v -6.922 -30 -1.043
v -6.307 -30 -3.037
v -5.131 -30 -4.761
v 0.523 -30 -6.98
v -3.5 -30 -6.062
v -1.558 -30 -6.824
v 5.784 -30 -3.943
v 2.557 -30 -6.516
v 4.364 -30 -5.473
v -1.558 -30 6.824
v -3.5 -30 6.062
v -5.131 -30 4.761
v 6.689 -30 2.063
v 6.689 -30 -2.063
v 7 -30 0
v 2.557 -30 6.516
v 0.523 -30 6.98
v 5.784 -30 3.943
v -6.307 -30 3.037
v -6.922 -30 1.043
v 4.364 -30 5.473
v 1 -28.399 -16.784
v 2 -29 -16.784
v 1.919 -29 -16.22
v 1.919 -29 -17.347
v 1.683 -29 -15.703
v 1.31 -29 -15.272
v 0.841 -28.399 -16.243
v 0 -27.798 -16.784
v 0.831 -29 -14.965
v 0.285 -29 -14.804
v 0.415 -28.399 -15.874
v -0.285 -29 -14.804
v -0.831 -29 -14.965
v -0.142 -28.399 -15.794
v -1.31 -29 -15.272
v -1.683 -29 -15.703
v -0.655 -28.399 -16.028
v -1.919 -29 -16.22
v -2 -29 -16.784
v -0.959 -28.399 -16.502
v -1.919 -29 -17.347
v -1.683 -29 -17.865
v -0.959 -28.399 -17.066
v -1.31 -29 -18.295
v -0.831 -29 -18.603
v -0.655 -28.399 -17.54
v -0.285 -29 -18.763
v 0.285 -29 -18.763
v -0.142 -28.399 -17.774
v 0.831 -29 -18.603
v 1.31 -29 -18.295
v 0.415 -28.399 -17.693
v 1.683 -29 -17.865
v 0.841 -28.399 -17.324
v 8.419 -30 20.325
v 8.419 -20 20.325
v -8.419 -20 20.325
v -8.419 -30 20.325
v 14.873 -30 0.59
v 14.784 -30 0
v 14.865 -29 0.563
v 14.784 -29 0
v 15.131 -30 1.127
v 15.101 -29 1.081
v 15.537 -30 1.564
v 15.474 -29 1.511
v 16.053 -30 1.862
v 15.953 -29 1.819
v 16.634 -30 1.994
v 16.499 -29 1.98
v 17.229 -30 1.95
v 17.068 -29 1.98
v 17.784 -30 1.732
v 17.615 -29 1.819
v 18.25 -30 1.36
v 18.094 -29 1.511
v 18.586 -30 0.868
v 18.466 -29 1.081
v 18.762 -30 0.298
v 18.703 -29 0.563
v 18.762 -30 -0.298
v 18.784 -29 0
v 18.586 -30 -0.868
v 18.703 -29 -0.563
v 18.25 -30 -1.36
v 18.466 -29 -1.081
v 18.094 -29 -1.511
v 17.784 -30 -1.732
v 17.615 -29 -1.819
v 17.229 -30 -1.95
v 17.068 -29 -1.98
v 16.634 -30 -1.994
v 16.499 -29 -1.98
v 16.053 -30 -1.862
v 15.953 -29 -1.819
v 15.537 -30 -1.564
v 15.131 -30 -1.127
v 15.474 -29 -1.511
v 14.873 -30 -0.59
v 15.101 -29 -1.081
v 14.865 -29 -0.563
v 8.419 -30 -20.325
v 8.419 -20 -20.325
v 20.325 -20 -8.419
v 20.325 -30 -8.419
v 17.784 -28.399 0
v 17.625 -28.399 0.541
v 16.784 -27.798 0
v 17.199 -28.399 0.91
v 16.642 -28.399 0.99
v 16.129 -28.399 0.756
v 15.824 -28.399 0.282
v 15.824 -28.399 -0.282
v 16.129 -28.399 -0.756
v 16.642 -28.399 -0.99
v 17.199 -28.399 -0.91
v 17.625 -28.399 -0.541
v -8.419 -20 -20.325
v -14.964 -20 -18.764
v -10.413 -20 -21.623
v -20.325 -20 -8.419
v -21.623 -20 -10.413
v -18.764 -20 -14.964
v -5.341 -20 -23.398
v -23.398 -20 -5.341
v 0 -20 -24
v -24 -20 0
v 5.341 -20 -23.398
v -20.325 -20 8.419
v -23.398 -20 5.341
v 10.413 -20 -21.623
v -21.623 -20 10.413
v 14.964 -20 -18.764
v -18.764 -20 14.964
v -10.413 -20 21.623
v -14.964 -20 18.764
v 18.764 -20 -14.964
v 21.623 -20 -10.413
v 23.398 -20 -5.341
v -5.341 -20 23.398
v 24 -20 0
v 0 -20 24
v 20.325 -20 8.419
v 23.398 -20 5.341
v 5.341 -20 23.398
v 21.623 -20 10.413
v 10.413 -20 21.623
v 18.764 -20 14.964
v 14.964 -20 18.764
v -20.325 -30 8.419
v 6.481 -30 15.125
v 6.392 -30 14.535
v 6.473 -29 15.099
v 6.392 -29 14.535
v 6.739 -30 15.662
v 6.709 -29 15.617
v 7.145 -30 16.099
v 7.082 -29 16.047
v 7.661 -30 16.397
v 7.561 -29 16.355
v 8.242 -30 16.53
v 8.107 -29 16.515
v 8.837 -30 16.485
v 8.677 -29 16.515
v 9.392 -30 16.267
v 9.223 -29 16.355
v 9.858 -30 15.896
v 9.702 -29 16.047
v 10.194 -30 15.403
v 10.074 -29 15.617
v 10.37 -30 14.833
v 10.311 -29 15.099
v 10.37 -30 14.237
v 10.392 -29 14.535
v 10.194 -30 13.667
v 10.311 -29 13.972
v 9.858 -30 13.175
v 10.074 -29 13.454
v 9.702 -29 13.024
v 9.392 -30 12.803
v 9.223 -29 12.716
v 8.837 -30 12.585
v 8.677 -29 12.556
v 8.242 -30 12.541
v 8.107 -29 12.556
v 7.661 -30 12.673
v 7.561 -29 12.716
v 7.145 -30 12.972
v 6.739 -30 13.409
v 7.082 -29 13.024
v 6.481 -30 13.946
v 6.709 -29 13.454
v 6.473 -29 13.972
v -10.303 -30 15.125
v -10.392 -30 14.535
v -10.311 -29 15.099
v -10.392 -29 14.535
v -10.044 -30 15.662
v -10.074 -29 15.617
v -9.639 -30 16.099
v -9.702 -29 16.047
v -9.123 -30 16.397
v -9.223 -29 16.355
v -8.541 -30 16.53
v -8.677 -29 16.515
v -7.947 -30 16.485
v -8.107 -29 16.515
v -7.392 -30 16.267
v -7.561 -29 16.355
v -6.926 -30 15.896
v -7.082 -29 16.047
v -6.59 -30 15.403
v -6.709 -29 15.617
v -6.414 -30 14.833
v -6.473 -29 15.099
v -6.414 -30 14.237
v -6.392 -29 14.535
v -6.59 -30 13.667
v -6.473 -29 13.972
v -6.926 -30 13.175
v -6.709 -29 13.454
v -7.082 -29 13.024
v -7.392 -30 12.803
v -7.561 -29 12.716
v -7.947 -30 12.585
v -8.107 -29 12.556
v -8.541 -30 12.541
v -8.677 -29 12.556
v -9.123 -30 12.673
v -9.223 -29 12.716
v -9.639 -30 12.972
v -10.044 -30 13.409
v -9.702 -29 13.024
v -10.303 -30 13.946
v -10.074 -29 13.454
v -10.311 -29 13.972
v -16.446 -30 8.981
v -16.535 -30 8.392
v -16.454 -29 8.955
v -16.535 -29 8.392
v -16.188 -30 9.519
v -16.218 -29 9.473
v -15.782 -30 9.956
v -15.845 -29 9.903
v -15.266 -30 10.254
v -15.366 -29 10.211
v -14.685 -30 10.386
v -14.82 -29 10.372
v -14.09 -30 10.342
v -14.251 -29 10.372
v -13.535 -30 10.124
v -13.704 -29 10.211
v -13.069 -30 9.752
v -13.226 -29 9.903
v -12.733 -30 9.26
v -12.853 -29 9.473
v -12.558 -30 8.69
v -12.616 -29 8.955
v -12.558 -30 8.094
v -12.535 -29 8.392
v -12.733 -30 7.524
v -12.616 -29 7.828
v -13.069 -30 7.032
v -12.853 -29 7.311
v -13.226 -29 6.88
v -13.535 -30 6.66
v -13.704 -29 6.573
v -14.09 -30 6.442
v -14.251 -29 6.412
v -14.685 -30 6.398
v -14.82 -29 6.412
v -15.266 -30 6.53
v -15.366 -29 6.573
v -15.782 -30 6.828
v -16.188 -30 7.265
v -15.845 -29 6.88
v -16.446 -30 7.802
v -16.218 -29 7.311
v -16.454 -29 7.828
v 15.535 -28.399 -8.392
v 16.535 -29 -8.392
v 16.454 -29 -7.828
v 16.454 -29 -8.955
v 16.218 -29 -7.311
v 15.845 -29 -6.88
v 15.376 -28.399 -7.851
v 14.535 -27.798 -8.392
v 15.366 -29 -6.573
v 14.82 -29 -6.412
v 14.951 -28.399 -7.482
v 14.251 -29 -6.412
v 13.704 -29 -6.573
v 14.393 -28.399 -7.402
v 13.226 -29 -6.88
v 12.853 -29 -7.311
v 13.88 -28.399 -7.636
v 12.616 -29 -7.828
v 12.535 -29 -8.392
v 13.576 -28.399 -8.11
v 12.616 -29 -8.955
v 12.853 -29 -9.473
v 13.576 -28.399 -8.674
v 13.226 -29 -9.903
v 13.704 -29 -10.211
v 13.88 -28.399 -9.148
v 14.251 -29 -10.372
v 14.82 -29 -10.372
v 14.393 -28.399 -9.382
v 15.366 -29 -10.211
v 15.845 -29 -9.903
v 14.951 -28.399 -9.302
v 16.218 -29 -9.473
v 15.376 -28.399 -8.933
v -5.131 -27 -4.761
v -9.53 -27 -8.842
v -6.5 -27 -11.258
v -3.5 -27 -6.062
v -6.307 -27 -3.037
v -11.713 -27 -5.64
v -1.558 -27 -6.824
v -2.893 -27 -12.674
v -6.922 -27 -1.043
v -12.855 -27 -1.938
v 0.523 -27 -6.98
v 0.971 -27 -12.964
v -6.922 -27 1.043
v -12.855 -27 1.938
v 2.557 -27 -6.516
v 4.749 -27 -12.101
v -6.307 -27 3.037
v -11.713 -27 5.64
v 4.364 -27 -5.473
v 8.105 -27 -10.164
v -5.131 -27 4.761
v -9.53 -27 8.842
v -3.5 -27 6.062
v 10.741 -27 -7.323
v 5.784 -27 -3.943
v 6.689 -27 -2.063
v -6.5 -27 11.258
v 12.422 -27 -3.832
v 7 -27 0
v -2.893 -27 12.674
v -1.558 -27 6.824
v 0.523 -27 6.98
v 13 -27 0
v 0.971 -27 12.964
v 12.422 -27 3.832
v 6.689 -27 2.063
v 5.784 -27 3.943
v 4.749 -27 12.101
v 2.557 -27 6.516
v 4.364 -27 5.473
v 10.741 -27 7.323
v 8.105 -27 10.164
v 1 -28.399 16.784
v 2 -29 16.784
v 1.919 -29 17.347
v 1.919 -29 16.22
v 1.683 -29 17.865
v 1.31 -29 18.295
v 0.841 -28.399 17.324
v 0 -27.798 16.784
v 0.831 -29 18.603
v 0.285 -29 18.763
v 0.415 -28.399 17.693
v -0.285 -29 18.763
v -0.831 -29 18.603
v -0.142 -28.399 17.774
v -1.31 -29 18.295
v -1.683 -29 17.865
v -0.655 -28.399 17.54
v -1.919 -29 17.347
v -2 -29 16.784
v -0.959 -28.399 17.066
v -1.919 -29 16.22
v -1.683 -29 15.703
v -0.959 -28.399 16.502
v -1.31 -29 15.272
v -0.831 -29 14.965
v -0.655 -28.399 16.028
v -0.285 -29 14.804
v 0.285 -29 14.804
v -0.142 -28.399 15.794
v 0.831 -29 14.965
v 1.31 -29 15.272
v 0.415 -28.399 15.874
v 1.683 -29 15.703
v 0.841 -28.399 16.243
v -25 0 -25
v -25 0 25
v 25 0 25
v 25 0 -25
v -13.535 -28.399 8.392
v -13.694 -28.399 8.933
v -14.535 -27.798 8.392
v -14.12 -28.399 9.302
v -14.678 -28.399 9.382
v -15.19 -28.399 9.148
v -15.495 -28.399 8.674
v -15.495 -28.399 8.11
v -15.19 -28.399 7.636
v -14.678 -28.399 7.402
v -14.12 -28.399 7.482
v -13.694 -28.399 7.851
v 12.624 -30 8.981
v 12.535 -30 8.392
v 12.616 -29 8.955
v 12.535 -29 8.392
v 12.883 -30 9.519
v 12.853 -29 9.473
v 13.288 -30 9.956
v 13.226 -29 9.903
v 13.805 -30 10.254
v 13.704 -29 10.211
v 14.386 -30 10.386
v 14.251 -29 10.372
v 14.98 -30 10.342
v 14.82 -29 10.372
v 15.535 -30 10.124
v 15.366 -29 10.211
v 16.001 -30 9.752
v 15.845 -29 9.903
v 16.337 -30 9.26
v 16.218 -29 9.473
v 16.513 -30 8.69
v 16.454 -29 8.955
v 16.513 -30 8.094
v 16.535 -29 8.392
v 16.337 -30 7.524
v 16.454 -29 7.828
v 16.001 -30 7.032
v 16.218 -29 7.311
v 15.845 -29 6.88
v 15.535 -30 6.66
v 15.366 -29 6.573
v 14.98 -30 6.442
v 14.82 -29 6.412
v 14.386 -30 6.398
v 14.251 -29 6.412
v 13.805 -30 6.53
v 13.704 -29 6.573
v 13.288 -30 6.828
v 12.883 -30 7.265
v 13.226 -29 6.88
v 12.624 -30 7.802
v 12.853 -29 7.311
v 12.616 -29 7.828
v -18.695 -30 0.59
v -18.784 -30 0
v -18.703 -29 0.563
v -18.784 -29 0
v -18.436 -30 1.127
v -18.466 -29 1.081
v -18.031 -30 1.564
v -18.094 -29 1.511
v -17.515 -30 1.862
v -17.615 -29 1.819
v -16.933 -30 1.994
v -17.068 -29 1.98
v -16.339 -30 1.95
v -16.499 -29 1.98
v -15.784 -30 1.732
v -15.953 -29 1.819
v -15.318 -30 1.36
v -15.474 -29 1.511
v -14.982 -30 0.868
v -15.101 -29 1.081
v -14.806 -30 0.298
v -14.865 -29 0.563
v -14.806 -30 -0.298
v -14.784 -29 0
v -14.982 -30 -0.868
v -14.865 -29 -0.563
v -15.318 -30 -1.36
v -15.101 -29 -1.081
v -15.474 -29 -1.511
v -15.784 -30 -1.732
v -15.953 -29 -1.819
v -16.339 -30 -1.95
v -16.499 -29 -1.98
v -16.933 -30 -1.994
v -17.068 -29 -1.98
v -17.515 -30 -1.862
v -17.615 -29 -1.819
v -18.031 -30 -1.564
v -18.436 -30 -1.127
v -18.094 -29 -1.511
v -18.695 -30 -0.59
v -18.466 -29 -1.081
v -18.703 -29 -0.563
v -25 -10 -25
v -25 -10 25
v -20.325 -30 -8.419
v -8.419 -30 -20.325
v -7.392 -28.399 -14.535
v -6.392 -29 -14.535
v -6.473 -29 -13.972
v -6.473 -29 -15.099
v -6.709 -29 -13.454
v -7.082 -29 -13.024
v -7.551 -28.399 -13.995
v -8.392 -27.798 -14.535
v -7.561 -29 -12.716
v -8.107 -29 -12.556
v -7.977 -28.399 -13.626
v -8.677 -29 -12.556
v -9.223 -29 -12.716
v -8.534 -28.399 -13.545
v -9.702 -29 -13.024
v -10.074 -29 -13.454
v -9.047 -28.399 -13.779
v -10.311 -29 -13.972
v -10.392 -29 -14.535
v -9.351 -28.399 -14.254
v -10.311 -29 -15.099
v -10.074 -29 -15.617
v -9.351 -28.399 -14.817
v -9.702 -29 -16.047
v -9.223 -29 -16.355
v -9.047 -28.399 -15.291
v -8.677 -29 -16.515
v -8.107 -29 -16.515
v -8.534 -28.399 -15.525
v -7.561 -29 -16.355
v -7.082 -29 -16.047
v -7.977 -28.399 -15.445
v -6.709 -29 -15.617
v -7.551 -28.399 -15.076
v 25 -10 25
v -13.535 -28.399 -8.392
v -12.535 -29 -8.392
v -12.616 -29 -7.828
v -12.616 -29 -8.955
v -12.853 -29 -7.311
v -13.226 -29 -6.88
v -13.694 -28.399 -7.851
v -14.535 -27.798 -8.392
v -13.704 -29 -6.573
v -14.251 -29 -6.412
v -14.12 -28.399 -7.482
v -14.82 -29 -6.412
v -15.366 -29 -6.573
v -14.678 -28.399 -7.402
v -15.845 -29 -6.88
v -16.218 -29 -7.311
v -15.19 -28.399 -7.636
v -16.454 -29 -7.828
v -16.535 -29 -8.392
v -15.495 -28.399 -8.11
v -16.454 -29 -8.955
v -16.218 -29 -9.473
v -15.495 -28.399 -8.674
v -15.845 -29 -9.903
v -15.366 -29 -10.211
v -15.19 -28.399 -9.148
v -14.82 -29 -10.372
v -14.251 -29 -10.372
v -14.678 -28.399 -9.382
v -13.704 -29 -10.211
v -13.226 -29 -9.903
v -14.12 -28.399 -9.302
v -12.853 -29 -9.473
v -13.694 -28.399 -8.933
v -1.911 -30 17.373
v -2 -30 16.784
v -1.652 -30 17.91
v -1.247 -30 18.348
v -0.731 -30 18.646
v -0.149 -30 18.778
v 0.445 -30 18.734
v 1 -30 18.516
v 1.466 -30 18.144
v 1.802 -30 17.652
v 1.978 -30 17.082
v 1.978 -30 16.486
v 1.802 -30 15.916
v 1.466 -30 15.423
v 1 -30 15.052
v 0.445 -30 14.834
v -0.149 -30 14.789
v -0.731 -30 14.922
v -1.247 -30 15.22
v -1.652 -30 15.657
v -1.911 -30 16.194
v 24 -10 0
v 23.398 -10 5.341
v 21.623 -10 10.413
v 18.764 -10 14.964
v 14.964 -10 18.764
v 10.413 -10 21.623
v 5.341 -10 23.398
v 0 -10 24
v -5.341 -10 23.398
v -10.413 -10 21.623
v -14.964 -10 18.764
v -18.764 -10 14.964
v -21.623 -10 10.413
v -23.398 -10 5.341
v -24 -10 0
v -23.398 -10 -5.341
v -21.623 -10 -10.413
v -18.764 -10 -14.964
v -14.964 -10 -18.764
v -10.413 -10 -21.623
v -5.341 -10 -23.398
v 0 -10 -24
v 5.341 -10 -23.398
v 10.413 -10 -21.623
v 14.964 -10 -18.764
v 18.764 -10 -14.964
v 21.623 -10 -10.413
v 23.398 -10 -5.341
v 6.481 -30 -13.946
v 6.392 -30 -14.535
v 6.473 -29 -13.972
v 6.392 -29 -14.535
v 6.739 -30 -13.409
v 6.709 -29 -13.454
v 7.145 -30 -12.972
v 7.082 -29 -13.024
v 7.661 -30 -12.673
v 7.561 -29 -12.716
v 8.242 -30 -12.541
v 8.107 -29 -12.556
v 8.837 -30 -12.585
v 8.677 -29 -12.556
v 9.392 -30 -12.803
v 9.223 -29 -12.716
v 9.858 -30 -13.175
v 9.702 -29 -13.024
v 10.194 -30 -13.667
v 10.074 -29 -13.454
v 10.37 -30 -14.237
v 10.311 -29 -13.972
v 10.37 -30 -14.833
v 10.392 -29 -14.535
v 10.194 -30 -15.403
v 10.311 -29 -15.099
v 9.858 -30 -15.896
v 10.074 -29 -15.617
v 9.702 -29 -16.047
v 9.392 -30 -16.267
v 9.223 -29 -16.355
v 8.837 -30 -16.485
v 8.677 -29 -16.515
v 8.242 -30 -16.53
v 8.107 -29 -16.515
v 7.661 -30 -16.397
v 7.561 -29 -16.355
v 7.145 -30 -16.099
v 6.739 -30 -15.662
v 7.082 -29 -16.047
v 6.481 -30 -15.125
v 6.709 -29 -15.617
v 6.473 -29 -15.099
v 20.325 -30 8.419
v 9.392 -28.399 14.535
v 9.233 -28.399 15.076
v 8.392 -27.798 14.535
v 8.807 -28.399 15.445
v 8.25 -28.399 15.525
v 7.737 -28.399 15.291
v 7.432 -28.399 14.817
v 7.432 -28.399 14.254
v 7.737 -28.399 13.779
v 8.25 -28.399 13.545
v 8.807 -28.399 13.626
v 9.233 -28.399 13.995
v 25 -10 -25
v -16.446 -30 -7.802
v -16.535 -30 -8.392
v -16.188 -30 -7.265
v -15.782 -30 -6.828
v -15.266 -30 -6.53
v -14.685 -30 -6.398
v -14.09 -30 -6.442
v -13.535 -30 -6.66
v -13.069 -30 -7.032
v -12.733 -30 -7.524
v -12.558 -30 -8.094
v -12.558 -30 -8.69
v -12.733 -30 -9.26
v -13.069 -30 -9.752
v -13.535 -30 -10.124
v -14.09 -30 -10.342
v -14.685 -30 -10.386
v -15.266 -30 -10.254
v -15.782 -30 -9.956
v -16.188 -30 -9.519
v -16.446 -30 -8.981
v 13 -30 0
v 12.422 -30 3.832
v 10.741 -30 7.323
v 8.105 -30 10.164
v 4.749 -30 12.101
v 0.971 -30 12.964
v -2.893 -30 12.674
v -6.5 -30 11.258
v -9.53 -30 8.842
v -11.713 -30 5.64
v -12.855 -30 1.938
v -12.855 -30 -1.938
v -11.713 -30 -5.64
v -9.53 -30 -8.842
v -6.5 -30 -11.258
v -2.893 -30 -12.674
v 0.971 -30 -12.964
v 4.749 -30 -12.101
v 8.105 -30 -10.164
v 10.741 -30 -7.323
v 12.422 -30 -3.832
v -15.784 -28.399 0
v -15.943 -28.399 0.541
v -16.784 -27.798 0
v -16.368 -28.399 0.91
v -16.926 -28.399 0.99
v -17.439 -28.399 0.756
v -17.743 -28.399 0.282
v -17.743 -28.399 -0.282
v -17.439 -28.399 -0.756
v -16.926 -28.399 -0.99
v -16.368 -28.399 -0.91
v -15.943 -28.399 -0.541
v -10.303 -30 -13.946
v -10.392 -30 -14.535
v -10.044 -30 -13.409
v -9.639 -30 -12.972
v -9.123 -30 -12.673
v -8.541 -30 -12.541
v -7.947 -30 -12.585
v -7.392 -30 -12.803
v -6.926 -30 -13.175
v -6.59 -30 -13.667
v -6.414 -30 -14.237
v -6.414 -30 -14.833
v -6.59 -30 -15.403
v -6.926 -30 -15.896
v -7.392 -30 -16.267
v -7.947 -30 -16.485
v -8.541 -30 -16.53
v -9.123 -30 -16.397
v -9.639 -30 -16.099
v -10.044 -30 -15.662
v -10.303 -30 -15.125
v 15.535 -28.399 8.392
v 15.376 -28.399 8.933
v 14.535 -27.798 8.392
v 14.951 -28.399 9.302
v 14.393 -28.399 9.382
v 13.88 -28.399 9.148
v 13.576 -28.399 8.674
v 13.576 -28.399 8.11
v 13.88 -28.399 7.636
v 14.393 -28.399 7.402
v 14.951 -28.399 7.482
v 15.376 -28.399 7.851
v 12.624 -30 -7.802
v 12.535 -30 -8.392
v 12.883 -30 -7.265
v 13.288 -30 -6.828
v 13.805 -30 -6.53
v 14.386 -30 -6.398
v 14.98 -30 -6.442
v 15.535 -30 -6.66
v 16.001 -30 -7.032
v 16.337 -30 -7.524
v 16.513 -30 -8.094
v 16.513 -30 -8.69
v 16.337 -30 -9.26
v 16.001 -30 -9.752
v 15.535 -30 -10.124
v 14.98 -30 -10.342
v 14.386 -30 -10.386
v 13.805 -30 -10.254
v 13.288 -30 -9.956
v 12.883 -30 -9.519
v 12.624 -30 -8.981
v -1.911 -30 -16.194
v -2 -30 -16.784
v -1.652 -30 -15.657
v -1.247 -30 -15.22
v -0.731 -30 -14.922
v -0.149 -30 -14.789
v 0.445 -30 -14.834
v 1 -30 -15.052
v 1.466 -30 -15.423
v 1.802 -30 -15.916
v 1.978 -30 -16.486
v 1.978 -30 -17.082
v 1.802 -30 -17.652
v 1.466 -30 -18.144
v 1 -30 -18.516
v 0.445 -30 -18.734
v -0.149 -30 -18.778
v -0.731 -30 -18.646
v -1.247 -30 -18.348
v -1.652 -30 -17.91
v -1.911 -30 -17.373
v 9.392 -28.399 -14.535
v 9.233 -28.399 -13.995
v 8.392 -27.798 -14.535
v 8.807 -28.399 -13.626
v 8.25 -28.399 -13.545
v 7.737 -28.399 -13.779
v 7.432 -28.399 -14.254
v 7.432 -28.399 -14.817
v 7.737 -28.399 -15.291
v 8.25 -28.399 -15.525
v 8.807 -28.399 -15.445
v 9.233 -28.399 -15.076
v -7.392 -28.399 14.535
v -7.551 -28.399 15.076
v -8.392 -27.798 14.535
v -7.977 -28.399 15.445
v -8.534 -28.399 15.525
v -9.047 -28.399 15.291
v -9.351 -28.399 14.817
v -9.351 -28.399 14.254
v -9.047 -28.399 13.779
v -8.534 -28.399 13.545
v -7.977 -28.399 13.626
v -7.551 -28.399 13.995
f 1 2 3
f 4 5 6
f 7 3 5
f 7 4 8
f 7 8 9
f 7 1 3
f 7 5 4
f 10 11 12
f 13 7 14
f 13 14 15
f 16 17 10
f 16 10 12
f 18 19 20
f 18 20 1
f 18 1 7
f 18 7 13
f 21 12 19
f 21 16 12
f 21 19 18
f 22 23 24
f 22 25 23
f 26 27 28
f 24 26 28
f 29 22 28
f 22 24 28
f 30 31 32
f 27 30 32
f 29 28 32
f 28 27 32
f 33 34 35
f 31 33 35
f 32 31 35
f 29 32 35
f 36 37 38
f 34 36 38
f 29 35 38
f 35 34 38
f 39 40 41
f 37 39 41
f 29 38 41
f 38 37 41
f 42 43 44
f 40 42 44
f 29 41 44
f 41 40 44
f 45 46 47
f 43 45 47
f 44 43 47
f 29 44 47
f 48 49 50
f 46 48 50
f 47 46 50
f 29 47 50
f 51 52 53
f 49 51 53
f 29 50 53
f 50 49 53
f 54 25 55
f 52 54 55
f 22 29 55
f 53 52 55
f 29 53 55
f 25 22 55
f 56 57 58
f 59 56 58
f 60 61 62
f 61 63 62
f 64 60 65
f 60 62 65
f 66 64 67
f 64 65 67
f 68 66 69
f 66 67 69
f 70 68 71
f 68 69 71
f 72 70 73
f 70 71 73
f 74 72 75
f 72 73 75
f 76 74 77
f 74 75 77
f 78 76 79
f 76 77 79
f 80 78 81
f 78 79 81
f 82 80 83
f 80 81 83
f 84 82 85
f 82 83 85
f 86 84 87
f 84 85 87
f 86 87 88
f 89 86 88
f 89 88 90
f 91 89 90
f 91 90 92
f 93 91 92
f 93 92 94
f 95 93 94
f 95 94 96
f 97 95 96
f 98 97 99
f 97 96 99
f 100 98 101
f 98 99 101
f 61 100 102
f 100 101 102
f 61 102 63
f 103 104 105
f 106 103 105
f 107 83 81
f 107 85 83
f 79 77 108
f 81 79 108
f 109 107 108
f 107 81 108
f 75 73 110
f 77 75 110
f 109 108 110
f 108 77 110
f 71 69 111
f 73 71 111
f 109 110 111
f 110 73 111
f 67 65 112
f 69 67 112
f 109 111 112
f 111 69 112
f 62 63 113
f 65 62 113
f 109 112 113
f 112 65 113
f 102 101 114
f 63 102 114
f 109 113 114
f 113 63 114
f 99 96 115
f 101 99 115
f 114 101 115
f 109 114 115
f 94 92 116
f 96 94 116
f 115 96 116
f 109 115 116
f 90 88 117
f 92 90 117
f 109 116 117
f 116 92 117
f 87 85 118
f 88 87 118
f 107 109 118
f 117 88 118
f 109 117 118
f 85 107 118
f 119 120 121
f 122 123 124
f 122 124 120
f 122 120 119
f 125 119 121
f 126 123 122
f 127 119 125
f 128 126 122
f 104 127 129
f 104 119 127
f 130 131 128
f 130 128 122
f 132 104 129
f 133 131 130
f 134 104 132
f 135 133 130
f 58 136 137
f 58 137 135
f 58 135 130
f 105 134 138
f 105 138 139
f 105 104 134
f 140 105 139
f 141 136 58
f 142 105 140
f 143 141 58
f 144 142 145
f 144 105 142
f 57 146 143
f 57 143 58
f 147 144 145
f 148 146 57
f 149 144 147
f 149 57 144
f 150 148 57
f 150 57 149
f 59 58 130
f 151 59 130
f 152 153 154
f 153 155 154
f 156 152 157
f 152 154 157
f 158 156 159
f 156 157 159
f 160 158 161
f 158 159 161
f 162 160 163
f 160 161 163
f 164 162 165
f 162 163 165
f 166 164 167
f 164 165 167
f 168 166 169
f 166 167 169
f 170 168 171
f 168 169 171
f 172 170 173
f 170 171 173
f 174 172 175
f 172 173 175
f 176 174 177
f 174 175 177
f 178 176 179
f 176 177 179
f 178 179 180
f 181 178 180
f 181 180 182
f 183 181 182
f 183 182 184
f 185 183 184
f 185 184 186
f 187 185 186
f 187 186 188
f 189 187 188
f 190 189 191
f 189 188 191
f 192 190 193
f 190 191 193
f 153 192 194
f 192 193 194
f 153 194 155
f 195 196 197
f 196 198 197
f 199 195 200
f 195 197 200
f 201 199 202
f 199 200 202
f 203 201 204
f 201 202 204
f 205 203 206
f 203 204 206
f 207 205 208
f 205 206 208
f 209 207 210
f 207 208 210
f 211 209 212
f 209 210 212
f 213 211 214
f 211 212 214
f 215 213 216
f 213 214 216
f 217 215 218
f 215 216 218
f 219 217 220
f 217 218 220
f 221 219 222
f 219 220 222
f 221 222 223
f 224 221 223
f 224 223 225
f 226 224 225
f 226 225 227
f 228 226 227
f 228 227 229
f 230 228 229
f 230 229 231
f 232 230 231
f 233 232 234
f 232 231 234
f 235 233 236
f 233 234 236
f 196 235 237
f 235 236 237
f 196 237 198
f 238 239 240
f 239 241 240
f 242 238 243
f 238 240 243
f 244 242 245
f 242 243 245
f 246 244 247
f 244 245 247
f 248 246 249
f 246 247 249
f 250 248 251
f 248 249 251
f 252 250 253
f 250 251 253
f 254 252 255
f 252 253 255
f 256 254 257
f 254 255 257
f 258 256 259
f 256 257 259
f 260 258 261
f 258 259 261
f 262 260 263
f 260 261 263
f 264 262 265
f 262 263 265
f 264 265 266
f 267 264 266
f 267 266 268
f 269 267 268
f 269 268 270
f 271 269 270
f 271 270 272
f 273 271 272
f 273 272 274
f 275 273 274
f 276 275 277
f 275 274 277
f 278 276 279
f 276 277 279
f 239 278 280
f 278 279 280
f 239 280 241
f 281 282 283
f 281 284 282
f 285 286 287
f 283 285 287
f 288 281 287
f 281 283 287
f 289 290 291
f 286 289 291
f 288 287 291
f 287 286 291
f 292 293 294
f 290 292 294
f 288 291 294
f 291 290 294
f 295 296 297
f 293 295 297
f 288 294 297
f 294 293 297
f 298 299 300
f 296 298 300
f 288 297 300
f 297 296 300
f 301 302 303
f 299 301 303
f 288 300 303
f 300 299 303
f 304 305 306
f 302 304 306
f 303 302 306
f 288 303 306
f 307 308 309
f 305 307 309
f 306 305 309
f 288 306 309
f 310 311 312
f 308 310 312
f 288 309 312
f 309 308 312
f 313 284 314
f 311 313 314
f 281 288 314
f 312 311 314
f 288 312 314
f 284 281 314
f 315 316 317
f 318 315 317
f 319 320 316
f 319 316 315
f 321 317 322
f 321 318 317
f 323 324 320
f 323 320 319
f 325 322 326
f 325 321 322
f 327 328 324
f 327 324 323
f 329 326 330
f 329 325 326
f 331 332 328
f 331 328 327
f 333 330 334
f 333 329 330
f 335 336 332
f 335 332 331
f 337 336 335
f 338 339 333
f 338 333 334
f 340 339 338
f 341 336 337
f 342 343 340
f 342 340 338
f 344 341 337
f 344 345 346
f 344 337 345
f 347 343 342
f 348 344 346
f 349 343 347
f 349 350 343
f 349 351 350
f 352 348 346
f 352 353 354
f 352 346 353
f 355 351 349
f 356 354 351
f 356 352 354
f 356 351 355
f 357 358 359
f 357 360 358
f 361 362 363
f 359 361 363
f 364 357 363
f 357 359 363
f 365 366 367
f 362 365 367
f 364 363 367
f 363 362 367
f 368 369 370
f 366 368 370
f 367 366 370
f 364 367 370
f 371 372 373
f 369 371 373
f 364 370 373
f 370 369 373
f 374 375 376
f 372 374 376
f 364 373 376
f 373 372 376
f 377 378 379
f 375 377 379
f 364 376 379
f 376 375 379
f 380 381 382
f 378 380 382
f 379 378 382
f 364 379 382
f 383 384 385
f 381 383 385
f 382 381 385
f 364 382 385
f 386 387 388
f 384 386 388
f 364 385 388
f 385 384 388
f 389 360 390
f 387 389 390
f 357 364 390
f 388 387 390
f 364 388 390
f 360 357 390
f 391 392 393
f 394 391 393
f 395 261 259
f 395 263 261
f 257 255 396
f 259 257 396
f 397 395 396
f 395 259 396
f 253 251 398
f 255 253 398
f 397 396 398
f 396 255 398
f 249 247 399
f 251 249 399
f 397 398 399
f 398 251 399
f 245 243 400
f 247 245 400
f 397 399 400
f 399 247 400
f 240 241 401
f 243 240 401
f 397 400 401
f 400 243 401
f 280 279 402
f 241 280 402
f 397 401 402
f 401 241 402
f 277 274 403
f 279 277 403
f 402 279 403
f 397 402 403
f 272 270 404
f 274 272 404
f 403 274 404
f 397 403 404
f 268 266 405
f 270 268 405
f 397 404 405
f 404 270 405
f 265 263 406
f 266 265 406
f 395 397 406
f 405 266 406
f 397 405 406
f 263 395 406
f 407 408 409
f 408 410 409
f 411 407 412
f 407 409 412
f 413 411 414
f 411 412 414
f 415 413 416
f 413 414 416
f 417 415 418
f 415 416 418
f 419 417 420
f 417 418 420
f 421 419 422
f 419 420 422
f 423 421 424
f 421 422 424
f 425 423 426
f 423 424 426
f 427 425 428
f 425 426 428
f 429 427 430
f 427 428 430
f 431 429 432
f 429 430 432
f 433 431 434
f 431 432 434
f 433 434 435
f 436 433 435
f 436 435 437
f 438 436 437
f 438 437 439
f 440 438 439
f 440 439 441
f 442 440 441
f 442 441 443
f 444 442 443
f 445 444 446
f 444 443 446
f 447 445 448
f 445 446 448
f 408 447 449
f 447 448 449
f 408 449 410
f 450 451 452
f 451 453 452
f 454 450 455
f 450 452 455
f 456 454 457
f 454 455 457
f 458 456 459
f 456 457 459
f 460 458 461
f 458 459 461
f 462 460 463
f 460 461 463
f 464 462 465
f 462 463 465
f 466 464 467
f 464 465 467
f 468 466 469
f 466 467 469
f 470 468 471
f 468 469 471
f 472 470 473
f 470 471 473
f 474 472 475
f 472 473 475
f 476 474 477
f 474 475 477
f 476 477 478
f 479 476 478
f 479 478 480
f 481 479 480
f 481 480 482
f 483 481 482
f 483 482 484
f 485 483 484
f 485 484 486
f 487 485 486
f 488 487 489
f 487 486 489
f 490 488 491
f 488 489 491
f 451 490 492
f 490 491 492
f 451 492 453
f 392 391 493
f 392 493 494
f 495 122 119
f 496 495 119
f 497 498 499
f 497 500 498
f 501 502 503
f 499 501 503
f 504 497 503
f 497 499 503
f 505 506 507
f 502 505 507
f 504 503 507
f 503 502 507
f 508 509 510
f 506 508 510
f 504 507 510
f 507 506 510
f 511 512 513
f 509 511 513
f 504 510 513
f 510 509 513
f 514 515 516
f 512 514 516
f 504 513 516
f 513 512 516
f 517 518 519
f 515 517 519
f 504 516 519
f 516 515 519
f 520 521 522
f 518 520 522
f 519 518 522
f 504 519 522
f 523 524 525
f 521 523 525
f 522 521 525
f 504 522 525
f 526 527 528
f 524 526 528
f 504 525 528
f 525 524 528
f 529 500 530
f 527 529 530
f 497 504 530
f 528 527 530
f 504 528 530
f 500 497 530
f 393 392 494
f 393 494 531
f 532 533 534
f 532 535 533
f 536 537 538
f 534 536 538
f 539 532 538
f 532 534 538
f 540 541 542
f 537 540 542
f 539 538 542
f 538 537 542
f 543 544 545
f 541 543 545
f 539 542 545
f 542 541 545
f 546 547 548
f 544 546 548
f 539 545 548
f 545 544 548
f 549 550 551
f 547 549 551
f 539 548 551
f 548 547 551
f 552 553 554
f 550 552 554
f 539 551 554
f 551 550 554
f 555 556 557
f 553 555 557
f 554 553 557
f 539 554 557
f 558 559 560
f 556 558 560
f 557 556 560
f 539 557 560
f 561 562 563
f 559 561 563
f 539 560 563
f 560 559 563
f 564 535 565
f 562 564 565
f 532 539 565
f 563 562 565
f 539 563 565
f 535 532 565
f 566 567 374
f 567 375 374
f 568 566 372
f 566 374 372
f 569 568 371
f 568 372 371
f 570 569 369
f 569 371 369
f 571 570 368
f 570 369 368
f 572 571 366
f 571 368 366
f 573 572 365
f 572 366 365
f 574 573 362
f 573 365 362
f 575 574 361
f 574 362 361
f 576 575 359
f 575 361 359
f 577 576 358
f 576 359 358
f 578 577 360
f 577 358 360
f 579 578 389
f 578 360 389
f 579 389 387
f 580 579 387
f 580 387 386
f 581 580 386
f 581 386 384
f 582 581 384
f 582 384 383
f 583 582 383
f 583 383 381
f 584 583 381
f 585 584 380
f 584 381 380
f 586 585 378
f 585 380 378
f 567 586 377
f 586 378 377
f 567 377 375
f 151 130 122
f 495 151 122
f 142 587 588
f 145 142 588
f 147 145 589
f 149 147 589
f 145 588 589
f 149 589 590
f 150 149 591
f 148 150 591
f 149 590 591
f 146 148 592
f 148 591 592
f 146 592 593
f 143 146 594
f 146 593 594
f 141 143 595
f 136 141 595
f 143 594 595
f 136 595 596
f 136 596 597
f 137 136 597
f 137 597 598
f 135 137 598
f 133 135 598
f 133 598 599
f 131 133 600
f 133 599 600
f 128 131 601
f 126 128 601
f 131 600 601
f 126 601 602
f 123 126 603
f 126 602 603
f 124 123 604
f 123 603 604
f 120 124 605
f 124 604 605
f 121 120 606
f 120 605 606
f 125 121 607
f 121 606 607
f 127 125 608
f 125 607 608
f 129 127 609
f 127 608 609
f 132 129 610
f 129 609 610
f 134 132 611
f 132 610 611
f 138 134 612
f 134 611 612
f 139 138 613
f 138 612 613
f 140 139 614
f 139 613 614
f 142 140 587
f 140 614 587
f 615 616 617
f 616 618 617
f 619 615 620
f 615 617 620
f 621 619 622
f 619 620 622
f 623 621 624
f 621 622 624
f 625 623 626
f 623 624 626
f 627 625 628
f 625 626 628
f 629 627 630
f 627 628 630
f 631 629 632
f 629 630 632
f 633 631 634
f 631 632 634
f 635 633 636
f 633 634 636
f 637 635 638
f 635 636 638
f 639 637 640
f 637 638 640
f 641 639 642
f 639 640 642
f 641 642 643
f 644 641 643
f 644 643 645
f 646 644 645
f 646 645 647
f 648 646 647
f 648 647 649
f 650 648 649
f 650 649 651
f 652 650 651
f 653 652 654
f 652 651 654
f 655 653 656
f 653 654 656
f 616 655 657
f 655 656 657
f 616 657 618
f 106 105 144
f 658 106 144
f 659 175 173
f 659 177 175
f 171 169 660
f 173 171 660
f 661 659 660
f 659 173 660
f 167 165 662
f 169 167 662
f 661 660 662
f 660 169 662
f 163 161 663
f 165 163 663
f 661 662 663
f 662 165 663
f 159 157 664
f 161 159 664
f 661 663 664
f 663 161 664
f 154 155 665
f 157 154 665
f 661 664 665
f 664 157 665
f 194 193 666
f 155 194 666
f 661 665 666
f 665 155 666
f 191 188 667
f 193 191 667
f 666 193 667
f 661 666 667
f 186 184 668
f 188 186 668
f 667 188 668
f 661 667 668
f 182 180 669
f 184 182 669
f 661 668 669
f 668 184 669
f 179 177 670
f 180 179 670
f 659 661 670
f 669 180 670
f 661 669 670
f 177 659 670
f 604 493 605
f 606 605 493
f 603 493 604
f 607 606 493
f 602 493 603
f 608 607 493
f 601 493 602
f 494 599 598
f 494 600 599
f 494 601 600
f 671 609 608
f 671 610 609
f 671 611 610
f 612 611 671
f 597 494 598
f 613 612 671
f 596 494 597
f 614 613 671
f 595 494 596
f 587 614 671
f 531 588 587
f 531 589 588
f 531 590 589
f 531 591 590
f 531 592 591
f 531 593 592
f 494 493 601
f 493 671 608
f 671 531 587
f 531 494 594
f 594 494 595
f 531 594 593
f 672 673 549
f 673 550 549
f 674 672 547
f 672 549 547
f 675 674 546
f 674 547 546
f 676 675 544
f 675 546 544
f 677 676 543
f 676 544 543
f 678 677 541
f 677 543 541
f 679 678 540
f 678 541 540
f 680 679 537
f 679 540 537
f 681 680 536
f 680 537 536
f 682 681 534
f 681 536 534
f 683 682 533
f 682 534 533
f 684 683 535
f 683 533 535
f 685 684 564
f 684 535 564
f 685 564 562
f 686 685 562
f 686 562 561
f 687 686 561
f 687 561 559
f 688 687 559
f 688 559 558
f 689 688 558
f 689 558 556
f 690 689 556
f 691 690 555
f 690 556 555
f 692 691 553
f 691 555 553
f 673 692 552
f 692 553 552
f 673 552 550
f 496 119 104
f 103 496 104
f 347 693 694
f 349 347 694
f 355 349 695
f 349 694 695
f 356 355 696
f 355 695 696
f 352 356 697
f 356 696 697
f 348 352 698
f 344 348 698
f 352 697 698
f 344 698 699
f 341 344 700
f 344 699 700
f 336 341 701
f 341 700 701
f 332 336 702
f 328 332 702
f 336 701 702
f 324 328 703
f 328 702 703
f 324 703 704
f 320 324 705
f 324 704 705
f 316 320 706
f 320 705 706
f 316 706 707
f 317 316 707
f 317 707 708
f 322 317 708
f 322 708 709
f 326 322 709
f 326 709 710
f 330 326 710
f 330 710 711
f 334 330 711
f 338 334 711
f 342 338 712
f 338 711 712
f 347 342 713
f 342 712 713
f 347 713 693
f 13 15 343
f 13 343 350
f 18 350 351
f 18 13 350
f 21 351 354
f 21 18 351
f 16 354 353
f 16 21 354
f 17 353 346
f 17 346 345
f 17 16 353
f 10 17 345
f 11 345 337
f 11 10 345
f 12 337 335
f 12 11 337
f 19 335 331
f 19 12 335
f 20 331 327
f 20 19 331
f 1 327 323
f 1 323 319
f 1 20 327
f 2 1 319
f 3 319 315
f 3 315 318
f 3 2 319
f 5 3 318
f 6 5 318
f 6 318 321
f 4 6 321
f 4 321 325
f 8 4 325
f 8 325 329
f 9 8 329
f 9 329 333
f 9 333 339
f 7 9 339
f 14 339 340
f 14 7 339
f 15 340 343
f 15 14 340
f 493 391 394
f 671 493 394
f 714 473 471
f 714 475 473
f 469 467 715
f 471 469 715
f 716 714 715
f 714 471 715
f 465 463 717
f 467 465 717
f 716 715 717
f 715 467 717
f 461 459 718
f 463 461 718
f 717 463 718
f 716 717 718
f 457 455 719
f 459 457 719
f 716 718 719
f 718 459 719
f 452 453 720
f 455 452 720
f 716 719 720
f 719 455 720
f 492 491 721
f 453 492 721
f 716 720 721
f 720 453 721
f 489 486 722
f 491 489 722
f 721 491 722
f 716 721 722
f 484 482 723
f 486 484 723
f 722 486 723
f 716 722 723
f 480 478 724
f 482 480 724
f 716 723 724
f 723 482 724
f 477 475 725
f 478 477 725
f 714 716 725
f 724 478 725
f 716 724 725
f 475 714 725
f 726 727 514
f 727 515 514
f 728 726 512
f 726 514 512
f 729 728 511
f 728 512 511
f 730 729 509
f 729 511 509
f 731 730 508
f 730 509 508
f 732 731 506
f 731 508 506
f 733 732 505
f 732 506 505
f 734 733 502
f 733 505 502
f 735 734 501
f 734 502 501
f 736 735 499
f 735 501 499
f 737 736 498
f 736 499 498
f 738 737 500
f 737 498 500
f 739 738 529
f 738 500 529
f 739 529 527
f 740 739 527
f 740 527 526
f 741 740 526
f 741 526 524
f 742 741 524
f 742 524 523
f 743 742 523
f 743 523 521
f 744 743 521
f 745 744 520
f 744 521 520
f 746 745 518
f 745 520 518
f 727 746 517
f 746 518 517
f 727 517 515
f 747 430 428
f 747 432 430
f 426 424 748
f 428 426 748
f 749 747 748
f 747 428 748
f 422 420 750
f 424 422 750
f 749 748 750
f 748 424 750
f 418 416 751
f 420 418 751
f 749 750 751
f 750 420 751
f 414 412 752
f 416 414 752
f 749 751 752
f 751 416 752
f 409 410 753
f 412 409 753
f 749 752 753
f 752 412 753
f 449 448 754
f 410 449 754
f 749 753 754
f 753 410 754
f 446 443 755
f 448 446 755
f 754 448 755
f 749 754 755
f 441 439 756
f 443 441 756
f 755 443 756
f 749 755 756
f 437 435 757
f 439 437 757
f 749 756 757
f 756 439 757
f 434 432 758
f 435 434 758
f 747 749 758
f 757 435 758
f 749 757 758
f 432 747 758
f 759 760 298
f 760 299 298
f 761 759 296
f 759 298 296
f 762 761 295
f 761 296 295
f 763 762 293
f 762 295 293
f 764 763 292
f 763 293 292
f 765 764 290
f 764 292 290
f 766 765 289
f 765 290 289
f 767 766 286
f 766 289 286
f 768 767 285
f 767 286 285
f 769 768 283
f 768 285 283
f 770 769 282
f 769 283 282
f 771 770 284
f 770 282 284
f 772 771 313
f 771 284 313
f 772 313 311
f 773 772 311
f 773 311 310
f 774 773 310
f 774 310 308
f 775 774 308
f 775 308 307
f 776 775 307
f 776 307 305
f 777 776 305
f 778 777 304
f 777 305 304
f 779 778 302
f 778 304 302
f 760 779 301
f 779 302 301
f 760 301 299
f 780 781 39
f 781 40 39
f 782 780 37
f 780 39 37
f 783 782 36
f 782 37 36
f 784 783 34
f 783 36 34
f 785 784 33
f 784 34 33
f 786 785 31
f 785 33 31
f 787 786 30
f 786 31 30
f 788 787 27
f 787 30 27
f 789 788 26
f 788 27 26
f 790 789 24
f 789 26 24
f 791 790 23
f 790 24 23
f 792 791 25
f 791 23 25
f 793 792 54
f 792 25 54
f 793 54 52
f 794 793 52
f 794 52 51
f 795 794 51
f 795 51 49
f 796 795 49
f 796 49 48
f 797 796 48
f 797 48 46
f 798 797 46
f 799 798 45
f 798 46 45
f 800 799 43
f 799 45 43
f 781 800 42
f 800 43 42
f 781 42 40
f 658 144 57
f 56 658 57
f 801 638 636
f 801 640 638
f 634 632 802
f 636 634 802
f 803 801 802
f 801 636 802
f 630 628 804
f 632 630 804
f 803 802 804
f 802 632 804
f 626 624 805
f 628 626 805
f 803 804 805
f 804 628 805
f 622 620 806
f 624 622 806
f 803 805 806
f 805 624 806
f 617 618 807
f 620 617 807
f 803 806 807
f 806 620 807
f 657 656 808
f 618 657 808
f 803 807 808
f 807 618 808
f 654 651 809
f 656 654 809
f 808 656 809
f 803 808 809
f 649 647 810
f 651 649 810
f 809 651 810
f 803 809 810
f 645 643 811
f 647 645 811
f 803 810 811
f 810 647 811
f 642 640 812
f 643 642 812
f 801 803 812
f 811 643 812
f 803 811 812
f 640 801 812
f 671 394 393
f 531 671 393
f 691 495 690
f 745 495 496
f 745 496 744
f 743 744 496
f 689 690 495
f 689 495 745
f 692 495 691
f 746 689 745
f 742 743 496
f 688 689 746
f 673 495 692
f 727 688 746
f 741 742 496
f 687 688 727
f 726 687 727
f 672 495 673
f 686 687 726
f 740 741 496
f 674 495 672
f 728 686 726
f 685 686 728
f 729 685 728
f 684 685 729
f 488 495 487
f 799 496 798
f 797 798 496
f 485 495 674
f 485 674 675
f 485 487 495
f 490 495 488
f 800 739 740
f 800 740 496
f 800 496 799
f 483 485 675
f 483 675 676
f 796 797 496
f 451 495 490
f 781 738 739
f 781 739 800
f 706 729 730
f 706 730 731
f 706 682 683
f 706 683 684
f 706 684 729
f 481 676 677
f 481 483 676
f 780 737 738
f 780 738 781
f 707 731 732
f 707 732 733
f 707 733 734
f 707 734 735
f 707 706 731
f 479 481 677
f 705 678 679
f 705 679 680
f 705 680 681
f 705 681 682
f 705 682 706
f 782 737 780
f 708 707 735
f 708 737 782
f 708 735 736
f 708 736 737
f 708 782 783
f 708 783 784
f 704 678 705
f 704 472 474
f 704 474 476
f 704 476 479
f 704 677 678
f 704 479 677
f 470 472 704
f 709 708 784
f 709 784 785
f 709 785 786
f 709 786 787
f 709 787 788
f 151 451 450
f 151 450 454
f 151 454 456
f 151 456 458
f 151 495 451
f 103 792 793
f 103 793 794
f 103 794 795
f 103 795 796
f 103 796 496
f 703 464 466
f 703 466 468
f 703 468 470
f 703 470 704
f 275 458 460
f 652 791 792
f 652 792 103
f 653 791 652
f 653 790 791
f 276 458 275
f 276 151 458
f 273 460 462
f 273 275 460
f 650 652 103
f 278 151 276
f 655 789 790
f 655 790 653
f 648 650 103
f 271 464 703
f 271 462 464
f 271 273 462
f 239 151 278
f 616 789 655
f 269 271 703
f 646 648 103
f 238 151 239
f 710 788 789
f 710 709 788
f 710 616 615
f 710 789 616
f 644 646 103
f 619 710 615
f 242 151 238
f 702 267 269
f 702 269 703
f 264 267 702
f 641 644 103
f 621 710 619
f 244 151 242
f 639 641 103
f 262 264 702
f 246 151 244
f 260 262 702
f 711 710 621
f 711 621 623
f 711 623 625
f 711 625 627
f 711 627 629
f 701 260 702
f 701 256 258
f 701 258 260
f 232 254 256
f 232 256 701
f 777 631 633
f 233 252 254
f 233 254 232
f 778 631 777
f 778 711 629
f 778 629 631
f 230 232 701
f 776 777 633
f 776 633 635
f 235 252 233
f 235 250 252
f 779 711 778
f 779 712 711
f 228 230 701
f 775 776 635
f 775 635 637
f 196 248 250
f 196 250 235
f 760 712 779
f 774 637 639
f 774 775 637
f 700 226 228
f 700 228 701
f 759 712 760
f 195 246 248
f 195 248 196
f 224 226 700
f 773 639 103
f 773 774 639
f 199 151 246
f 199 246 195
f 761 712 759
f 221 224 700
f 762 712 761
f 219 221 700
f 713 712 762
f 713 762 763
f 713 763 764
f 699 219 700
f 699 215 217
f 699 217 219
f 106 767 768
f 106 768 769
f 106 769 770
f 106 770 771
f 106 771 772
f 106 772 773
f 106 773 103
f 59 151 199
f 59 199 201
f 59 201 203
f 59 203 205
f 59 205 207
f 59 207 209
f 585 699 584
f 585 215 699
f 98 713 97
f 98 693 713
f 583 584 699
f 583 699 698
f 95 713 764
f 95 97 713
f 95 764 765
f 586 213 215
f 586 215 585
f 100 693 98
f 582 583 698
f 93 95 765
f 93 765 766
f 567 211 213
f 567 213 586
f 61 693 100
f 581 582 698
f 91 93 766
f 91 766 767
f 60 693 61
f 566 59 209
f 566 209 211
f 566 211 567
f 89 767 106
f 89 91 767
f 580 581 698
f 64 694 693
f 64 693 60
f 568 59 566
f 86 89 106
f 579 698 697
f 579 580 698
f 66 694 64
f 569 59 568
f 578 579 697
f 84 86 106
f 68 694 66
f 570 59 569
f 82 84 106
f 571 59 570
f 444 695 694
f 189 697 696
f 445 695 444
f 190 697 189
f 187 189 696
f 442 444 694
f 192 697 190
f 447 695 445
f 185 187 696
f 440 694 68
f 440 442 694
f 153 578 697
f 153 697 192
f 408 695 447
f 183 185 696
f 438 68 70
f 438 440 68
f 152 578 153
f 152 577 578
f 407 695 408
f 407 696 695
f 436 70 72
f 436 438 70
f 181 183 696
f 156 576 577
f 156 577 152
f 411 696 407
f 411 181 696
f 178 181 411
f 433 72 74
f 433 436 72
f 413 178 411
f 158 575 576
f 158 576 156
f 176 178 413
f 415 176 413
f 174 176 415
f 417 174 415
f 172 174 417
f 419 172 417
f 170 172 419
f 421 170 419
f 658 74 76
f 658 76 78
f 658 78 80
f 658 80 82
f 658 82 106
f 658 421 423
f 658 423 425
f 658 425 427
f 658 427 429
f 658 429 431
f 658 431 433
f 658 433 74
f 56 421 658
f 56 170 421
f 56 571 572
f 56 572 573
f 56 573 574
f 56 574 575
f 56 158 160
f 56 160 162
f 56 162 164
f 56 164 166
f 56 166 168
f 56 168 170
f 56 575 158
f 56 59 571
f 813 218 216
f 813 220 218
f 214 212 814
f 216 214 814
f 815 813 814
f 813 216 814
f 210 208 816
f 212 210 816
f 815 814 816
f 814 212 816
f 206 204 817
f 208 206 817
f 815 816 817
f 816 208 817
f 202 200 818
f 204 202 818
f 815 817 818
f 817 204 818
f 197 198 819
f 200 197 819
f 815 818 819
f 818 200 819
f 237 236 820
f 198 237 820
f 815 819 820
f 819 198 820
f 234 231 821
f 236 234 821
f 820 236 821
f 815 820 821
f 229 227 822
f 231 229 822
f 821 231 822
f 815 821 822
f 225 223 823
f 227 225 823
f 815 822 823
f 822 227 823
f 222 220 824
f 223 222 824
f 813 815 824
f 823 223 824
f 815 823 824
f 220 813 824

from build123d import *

# Parameters (mm, degrees)
F0_W     = 50
F0_H     = 50
F1_DEPTH = 10
F2_R     = 24
F3_DEPTH = 10
F5_DEPTH = 10
F7_D     = 4
F7_DEPTH = 1
F7_TIP   = 1.2017212381
F8_R     = 13
F8_R_2   = 7
F9_DEPTH = 3


with BuildPart() as f1:
    # F0 (on Front) → F1 (new body)
    with BuildSketch(Plane.XZ):
        Rectangle(F0_W, F0_H)
    extrude(amount=F1_DEPTH)

    # F2 (on face) → F3 (join)
    with BuildSketch(Plane.XZ.offset(10)):
        Circle(F2_R)
    extrude(amount=F3_DEPTH)

    # F4 (on face) → F5 (join)
    with BuildSketch(Plane.XZ.offset(20)):
        Polygon((20.325, 8.4188906552), (8.4188906552, 20.325), (0, 20.325), (-8.4188906552, 20.325), (-20.325, 8.4188906552), (-20.325, -8.4188906552), (-8.4188906552, -20.325), (8.4188906552, -20.325), (20.325, -8.4188906552), align=None)
    extrude(amount=F5_DEPTH)

    # F7
    with Locations(Plane.XZ.offset(30)):
        with Locations((-8.3919226456, 14.5352363953), (0, 16.7838452912), (8.3919226456, 14.5352363953), (14.5352363953, 8.3919226456), (16.7838452912, 0), (14.5352363953, -8.3919226456), (8.3919226456, -14.5352363953), (0, -16.7838452912), (-8.3919226456, -14.5352363953), (-14.5352363953, -8.3919226456), (-16.7838452912, 0), (-14.5352363953, 8.3919226456)):
            Hole(F7_D / 2, depth=F7_DEPTH)
            with Locations((0, 0, -(F7_DEPTH + F7_TIP / 2))):  # 118° drill point
                Cone(0, F7_D / 2, F7_TIP, mode=Mode.SUBTRACT)

    # F8 (on face) → F9 (cut)
    with BuildSketch(Plane.XZ.offset(30)):
        Circle(F8_R)
        Circle(F8_R_2, mode=Mode.SUBTRACT)
    extrude(amount=-F9_DEPTH, mode=Mode.SUBTRACT)


solid = f1.part
